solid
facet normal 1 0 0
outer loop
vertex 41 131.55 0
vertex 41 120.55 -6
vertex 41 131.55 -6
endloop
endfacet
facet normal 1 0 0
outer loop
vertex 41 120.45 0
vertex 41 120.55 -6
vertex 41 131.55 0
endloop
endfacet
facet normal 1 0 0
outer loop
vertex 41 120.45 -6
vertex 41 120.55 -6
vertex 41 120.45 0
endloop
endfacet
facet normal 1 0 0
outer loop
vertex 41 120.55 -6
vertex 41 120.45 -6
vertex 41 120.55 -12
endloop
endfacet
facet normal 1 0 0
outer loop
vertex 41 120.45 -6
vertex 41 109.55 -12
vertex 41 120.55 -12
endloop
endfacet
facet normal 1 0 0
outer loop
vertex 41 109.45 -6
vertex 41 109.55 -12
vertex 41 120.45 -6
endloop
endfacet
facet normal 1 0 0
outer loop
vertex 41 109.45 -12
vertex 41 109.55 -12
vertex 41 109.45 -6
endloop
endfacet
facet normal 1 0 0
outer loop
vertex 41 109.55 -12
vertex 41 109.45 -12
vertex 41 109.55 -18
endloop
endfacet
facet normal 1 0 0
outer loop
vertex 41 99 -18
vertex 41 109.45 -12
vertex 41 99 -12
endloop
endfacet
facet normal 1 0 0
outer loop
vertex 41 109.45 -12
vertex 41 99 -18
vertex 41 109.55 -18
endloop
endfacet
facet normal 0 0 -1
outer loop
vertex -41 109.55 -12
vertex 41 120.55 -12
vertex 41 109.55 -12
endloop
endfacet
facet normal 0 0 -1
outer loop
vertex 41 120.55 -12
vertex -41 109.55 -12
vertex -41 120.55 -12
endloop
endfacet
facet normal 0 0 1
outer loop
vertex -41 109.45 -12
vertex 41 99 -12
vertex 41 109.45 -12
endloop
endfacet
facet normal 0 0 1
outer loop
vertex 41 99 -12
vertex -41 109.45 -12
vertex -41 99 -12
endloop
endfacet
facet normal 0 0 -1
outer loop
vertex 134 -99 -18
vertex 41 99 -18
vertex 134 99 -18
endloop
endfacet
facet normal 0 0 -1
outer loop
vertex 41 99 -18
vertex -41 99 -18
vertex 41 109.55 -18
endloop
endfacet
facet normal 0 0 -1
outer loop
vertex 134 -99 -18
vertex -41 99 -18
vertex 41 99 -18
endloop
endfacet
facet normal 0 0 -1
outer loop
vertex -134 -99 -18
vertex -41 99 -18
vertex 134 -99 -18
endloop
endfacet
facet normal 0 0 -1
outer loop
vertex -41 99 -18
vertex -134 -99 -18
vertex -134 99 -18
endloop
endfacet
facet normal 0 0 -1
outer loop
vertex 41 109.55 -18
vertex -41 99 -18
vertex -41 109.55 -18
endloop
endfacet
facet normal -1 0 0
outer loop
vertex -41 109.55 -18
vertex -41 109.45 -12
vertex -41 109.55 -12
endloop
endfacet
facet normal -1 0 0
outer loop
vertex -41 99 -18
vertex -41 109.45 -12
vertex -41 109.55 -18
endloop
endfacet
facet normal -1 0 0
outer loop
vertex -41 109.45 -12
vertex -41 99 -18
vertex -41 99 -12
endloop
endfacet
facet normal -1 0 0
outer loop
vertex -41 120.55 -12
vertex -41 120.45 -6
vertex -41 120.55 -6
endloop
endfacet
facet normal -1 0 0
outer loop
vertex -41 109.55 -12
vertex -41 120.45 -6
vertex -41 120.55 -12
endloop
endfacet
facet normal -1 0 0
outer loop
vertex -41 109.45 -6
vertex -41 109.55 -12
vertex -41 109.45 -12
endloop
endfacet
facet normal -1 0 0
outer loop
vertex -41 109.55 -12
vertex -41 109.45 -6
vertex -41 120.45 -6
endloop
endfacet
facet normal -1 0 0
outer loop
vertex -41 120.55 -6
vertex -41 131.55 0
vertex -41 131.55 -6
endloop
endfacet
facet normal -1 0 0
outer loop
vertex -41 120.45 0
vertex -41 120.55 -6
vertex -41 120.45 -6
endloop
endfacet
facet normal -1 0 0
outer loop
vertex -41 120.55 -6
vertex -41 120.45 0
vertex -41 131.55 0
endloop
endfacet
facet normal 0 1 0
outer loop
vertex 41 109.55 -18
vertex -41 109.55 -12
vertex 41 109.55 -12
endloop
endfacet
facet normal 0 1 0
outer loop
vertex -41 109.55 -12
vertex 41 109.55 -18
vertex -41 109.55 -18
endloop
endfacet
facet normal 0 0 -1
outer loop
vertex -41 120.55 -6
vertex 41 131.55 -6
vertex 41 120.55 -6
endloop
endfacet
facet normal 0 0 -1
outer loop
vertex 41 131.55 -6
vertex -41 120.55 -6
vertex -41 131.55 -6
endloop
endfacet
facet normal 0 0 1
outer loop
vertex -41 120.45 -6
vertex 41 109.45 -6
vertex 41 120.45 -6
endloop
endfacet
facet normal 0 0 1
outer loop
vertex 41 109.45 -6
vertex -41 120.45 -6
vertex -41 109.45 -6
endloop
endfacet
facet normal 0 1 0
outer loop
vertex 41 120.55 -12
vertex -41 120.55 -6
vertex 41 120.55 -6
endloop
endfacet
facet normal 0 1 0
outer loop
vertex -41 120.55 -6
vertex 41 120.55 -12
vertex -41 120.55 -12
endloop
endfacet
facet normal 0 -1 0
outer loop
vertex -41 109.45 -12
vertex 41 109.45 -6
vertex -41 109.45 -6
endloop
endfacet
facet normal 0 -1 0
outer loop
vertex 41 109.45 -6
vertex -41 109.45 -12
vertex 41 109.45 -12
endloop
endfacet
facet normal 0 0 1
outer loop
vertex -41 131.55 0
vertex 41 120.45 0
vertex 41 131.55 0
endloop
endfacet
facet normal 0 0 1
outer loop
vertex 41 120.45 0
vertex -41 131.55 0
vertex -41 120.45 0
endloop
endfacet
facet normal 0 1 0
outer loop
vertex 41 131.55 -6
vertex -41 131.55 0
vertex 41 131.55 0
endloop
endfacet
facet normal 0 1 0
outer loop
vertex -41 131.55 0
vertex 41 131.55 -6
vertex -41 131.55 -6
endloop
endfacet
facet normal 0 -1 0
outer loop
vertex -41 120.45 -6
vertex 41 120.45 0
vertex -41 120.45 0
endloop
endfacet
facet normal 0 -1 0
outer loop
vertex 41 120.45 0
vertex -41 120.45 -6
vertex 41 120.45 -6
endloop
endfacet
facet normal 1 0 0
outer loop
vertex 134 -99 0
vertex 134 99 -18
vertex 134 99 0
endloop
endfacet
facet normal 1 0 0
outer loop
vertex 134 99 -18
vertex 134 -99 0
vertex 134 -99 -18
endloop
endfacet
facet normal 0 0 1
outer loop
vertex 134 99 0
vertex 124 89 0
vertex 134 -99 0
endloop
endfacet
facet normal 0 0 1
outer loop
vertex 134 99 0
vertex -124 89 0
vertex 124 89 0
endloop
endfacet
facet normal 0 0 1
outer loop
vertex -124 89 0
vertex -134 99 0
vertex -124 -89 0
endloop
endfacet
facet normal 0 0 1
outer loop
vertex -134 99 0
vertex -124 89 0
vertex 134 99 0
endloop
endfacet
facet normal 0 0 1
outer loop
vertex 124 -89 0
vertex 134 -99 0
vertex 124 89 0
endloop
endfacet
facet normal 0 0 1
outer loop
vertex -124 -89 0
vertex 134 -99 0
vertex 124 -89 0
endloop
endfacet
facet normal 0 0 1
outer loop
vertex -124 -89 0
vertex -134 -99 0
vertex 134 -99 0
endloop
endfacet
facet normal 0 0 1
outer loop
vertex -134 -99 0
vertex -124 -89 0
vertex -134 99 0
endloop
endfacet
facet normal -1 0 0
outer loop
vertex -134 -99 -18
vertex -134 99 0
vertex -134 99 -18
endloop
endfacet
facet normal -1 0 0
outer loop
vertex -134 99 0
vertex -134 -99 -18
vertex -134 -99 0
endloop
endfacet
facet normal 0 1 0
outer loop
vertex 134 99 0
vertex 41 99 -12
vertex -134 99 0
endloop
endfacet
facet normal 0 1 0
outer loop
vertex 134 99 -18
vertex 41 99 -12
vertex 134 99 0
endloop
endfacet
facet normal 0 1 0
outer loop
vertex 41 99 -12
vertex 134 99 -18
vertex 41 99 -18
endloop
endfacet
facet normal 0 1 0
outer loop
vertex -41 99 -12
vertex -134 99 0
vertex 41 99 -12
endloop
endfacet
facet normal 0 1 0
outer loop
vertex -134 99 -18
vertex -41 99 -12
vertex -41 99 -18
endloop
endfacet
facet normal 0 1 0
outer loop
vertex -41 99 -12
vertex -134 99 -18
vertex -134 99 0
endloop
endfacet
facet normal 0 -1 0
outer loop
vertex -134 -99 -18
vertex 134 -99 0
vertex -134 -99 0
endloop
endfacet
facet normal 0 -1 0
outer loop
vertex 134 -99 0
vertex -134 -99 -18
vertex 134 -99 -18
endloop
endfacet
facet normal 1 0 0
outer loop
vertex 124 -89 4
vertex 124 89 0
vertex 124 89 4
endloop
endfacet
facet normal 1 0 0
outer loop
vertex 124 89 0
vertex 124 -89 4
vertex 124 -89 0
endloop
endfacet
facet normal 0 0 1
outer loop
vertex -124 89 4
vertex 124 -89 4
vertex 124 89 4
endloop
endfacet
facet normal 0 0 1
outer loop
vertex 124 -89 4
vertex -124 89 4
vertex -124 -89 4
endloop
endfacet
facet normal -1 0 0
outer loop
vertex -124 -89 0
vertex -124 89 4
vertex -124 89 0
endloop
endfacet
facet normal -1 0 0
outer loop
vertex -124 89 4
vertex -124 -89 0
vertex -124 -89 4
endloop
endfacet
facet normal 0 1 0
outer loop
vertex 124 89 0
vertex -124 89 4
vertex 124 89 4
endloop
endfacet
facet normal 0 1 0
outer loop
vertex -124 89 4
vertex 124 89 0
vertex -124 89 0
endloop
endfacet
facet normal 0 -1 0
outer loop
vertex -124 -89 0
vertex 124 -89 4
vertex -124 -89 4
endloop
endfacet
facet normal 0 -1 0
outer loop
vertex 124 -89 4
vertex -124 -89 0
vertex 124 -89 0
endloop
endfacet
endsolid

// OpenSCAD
// file: common.scad
// Shared parameters and placement helpers for the dollhouse.
// `include`d by every component file so variables AND helper modules propagate.

$fa = 2;
$fs = 0.5;
eps = 0.1;

// ---- Core house dimensions (mm) ----
house_w = 240;          // width  (X)
house_d = 170;          // depth  (Y)
wall_t  = 8;            // exterior wall thickness
floor_h = 130;          // interior storey height
mid_t   = 8;            // mid-floor slab thickness
wall_height = floor_h * 2 + mid_t;   // 268
half_depth  = house_d / 2;           // 85

// ---- Roof ----
gable_rise = 95;
ridge_z    = wall_height + gable_rise;   // 363
over_x     = 18;        // gable-end overhang
over_y     = 18;        // eave overhang
roof_w     = house_w + 2 * over_x;       // 276
roof_t     = 9;
ridge_r    = 7;
theta      = atan(gable_rise / half_depth);
panel_len  = (half_depth + over_y) / cos(theta);

// ---- Foundation ----
foundation_h    = 18;
foundation_over = 14;

// ---- Windows ----
win_w   = 42;
win_h   = 58;
frame_w = 6;
frame_t_out = 5;        // how far trim/frame protrudes outside
mull_w  = 3;
ground_z = 67;          // window centre, ground floor
upper_z  = 201;         // window centre, upper floor

// ---- Door ----
door_w = 56;
door_h = 104;

// ---- Chimney ----
chimney_w   = 26;
chimney_d   = 22;
chimney_x   = -72;
chimney_y   = 38;
chimney_base_z = 250;
chimney_top = ridge_z + 40;   // 403

// ---- Window / opening placement lists [u, z_centre] ----
front_windows = [[-80, ground_z], [80, ground_z],
                 [-80, upper_z], [0, upper_z], [80, upper_z]];
back_windows  = [[-80, ground_z], [80, ground_z],
                 [-80, upper_z], [80, upper_z]];
side_windows  = [[-40, ground_z], [40, ground_z],
                 [-40, upper_z], [40, upper_z]];

// ---- Colours ----
col_wall    = "#F2E7CE";
col_roof    = "#9B3B2E";
col_trim    = "#FBFBF7";
col_door    = "#3C5A78";
col_found   = "#9A968E";
col_glass   = "#AFC9DE";
col_chimney = "#A14B36";
col_shutter = "#46603F";
col_stair   = "#C8A97E";

// ---- Helpers ----------------------------------------------------------

// Position children flush against a given exterior face, local +Y = outward.
module place_on_face(face, u, z) {
    if (face == "front")
        translate([u, half_depth, z]) children();
    else if (face == "back")
        translate([u, -half_depth, z]) rotate([0, 0, 180]) children();
    else if (face == "left")
        translate([-house_w / 2, u, z]) rotate([0, 0, 90]) children();
    else
        translate([house_w / 2, u, z]) rotate([0, 0, -90]) children();
}

// Solid that pierces a wall to make a window/door opening.
module opening_cut(face, u, z, w, h) {
    if (face == "front")
        translate([u, half_depth - wall_t / 2, z])
            cube([w, wall_t + 4, h], center = true);
    else if (face == "back")
        translate([u, -(half_depth - wall_t / 2), z])
            cube([w, wall_t + 4, h], center = true);
    else if (face == "left")
        translate([-(house_w / 2 - wall_t / 2), u, z])
            cube([wall_t + 4, w, h], center = true);
    else
        translate([house_w / 2 - wall_t / 2, u, z])
            cube([wall_t + 4, w, h], center = true);
}
// main file
include <common.scad>

// Stone foundation slab with a small skirt and front entry steps.
module foundation() {
    fw = house_w + 2 * foundation_over;
    fd = house_d + 2 * foundation_over;
    color(col_found) {
        // main slab
        translate([0, 0, -foundation_h / 2])
            cube([fw, fd, foundation_h], center = true);
        // narrow plinth band just under the walls
        translate([0, 0, 4 / 2])
            cube([house_w + 8, house_d + 8, 4], center = true);

        // Front steps leading up to the door.
        n_steps = 3;
        step_d  = 11;
        step_h  = foundation_h / n_steps;
        for (i = [0 : n_steps - 1])
            translate([0, fd / 2 + step_d * (i + 0.5) - 0.5,
                       -foundation_h + step_h * (i + 0.5)])
                cube([door_w + 26, step_d + eps, step_h], center = true);
    }
}

foundation();
